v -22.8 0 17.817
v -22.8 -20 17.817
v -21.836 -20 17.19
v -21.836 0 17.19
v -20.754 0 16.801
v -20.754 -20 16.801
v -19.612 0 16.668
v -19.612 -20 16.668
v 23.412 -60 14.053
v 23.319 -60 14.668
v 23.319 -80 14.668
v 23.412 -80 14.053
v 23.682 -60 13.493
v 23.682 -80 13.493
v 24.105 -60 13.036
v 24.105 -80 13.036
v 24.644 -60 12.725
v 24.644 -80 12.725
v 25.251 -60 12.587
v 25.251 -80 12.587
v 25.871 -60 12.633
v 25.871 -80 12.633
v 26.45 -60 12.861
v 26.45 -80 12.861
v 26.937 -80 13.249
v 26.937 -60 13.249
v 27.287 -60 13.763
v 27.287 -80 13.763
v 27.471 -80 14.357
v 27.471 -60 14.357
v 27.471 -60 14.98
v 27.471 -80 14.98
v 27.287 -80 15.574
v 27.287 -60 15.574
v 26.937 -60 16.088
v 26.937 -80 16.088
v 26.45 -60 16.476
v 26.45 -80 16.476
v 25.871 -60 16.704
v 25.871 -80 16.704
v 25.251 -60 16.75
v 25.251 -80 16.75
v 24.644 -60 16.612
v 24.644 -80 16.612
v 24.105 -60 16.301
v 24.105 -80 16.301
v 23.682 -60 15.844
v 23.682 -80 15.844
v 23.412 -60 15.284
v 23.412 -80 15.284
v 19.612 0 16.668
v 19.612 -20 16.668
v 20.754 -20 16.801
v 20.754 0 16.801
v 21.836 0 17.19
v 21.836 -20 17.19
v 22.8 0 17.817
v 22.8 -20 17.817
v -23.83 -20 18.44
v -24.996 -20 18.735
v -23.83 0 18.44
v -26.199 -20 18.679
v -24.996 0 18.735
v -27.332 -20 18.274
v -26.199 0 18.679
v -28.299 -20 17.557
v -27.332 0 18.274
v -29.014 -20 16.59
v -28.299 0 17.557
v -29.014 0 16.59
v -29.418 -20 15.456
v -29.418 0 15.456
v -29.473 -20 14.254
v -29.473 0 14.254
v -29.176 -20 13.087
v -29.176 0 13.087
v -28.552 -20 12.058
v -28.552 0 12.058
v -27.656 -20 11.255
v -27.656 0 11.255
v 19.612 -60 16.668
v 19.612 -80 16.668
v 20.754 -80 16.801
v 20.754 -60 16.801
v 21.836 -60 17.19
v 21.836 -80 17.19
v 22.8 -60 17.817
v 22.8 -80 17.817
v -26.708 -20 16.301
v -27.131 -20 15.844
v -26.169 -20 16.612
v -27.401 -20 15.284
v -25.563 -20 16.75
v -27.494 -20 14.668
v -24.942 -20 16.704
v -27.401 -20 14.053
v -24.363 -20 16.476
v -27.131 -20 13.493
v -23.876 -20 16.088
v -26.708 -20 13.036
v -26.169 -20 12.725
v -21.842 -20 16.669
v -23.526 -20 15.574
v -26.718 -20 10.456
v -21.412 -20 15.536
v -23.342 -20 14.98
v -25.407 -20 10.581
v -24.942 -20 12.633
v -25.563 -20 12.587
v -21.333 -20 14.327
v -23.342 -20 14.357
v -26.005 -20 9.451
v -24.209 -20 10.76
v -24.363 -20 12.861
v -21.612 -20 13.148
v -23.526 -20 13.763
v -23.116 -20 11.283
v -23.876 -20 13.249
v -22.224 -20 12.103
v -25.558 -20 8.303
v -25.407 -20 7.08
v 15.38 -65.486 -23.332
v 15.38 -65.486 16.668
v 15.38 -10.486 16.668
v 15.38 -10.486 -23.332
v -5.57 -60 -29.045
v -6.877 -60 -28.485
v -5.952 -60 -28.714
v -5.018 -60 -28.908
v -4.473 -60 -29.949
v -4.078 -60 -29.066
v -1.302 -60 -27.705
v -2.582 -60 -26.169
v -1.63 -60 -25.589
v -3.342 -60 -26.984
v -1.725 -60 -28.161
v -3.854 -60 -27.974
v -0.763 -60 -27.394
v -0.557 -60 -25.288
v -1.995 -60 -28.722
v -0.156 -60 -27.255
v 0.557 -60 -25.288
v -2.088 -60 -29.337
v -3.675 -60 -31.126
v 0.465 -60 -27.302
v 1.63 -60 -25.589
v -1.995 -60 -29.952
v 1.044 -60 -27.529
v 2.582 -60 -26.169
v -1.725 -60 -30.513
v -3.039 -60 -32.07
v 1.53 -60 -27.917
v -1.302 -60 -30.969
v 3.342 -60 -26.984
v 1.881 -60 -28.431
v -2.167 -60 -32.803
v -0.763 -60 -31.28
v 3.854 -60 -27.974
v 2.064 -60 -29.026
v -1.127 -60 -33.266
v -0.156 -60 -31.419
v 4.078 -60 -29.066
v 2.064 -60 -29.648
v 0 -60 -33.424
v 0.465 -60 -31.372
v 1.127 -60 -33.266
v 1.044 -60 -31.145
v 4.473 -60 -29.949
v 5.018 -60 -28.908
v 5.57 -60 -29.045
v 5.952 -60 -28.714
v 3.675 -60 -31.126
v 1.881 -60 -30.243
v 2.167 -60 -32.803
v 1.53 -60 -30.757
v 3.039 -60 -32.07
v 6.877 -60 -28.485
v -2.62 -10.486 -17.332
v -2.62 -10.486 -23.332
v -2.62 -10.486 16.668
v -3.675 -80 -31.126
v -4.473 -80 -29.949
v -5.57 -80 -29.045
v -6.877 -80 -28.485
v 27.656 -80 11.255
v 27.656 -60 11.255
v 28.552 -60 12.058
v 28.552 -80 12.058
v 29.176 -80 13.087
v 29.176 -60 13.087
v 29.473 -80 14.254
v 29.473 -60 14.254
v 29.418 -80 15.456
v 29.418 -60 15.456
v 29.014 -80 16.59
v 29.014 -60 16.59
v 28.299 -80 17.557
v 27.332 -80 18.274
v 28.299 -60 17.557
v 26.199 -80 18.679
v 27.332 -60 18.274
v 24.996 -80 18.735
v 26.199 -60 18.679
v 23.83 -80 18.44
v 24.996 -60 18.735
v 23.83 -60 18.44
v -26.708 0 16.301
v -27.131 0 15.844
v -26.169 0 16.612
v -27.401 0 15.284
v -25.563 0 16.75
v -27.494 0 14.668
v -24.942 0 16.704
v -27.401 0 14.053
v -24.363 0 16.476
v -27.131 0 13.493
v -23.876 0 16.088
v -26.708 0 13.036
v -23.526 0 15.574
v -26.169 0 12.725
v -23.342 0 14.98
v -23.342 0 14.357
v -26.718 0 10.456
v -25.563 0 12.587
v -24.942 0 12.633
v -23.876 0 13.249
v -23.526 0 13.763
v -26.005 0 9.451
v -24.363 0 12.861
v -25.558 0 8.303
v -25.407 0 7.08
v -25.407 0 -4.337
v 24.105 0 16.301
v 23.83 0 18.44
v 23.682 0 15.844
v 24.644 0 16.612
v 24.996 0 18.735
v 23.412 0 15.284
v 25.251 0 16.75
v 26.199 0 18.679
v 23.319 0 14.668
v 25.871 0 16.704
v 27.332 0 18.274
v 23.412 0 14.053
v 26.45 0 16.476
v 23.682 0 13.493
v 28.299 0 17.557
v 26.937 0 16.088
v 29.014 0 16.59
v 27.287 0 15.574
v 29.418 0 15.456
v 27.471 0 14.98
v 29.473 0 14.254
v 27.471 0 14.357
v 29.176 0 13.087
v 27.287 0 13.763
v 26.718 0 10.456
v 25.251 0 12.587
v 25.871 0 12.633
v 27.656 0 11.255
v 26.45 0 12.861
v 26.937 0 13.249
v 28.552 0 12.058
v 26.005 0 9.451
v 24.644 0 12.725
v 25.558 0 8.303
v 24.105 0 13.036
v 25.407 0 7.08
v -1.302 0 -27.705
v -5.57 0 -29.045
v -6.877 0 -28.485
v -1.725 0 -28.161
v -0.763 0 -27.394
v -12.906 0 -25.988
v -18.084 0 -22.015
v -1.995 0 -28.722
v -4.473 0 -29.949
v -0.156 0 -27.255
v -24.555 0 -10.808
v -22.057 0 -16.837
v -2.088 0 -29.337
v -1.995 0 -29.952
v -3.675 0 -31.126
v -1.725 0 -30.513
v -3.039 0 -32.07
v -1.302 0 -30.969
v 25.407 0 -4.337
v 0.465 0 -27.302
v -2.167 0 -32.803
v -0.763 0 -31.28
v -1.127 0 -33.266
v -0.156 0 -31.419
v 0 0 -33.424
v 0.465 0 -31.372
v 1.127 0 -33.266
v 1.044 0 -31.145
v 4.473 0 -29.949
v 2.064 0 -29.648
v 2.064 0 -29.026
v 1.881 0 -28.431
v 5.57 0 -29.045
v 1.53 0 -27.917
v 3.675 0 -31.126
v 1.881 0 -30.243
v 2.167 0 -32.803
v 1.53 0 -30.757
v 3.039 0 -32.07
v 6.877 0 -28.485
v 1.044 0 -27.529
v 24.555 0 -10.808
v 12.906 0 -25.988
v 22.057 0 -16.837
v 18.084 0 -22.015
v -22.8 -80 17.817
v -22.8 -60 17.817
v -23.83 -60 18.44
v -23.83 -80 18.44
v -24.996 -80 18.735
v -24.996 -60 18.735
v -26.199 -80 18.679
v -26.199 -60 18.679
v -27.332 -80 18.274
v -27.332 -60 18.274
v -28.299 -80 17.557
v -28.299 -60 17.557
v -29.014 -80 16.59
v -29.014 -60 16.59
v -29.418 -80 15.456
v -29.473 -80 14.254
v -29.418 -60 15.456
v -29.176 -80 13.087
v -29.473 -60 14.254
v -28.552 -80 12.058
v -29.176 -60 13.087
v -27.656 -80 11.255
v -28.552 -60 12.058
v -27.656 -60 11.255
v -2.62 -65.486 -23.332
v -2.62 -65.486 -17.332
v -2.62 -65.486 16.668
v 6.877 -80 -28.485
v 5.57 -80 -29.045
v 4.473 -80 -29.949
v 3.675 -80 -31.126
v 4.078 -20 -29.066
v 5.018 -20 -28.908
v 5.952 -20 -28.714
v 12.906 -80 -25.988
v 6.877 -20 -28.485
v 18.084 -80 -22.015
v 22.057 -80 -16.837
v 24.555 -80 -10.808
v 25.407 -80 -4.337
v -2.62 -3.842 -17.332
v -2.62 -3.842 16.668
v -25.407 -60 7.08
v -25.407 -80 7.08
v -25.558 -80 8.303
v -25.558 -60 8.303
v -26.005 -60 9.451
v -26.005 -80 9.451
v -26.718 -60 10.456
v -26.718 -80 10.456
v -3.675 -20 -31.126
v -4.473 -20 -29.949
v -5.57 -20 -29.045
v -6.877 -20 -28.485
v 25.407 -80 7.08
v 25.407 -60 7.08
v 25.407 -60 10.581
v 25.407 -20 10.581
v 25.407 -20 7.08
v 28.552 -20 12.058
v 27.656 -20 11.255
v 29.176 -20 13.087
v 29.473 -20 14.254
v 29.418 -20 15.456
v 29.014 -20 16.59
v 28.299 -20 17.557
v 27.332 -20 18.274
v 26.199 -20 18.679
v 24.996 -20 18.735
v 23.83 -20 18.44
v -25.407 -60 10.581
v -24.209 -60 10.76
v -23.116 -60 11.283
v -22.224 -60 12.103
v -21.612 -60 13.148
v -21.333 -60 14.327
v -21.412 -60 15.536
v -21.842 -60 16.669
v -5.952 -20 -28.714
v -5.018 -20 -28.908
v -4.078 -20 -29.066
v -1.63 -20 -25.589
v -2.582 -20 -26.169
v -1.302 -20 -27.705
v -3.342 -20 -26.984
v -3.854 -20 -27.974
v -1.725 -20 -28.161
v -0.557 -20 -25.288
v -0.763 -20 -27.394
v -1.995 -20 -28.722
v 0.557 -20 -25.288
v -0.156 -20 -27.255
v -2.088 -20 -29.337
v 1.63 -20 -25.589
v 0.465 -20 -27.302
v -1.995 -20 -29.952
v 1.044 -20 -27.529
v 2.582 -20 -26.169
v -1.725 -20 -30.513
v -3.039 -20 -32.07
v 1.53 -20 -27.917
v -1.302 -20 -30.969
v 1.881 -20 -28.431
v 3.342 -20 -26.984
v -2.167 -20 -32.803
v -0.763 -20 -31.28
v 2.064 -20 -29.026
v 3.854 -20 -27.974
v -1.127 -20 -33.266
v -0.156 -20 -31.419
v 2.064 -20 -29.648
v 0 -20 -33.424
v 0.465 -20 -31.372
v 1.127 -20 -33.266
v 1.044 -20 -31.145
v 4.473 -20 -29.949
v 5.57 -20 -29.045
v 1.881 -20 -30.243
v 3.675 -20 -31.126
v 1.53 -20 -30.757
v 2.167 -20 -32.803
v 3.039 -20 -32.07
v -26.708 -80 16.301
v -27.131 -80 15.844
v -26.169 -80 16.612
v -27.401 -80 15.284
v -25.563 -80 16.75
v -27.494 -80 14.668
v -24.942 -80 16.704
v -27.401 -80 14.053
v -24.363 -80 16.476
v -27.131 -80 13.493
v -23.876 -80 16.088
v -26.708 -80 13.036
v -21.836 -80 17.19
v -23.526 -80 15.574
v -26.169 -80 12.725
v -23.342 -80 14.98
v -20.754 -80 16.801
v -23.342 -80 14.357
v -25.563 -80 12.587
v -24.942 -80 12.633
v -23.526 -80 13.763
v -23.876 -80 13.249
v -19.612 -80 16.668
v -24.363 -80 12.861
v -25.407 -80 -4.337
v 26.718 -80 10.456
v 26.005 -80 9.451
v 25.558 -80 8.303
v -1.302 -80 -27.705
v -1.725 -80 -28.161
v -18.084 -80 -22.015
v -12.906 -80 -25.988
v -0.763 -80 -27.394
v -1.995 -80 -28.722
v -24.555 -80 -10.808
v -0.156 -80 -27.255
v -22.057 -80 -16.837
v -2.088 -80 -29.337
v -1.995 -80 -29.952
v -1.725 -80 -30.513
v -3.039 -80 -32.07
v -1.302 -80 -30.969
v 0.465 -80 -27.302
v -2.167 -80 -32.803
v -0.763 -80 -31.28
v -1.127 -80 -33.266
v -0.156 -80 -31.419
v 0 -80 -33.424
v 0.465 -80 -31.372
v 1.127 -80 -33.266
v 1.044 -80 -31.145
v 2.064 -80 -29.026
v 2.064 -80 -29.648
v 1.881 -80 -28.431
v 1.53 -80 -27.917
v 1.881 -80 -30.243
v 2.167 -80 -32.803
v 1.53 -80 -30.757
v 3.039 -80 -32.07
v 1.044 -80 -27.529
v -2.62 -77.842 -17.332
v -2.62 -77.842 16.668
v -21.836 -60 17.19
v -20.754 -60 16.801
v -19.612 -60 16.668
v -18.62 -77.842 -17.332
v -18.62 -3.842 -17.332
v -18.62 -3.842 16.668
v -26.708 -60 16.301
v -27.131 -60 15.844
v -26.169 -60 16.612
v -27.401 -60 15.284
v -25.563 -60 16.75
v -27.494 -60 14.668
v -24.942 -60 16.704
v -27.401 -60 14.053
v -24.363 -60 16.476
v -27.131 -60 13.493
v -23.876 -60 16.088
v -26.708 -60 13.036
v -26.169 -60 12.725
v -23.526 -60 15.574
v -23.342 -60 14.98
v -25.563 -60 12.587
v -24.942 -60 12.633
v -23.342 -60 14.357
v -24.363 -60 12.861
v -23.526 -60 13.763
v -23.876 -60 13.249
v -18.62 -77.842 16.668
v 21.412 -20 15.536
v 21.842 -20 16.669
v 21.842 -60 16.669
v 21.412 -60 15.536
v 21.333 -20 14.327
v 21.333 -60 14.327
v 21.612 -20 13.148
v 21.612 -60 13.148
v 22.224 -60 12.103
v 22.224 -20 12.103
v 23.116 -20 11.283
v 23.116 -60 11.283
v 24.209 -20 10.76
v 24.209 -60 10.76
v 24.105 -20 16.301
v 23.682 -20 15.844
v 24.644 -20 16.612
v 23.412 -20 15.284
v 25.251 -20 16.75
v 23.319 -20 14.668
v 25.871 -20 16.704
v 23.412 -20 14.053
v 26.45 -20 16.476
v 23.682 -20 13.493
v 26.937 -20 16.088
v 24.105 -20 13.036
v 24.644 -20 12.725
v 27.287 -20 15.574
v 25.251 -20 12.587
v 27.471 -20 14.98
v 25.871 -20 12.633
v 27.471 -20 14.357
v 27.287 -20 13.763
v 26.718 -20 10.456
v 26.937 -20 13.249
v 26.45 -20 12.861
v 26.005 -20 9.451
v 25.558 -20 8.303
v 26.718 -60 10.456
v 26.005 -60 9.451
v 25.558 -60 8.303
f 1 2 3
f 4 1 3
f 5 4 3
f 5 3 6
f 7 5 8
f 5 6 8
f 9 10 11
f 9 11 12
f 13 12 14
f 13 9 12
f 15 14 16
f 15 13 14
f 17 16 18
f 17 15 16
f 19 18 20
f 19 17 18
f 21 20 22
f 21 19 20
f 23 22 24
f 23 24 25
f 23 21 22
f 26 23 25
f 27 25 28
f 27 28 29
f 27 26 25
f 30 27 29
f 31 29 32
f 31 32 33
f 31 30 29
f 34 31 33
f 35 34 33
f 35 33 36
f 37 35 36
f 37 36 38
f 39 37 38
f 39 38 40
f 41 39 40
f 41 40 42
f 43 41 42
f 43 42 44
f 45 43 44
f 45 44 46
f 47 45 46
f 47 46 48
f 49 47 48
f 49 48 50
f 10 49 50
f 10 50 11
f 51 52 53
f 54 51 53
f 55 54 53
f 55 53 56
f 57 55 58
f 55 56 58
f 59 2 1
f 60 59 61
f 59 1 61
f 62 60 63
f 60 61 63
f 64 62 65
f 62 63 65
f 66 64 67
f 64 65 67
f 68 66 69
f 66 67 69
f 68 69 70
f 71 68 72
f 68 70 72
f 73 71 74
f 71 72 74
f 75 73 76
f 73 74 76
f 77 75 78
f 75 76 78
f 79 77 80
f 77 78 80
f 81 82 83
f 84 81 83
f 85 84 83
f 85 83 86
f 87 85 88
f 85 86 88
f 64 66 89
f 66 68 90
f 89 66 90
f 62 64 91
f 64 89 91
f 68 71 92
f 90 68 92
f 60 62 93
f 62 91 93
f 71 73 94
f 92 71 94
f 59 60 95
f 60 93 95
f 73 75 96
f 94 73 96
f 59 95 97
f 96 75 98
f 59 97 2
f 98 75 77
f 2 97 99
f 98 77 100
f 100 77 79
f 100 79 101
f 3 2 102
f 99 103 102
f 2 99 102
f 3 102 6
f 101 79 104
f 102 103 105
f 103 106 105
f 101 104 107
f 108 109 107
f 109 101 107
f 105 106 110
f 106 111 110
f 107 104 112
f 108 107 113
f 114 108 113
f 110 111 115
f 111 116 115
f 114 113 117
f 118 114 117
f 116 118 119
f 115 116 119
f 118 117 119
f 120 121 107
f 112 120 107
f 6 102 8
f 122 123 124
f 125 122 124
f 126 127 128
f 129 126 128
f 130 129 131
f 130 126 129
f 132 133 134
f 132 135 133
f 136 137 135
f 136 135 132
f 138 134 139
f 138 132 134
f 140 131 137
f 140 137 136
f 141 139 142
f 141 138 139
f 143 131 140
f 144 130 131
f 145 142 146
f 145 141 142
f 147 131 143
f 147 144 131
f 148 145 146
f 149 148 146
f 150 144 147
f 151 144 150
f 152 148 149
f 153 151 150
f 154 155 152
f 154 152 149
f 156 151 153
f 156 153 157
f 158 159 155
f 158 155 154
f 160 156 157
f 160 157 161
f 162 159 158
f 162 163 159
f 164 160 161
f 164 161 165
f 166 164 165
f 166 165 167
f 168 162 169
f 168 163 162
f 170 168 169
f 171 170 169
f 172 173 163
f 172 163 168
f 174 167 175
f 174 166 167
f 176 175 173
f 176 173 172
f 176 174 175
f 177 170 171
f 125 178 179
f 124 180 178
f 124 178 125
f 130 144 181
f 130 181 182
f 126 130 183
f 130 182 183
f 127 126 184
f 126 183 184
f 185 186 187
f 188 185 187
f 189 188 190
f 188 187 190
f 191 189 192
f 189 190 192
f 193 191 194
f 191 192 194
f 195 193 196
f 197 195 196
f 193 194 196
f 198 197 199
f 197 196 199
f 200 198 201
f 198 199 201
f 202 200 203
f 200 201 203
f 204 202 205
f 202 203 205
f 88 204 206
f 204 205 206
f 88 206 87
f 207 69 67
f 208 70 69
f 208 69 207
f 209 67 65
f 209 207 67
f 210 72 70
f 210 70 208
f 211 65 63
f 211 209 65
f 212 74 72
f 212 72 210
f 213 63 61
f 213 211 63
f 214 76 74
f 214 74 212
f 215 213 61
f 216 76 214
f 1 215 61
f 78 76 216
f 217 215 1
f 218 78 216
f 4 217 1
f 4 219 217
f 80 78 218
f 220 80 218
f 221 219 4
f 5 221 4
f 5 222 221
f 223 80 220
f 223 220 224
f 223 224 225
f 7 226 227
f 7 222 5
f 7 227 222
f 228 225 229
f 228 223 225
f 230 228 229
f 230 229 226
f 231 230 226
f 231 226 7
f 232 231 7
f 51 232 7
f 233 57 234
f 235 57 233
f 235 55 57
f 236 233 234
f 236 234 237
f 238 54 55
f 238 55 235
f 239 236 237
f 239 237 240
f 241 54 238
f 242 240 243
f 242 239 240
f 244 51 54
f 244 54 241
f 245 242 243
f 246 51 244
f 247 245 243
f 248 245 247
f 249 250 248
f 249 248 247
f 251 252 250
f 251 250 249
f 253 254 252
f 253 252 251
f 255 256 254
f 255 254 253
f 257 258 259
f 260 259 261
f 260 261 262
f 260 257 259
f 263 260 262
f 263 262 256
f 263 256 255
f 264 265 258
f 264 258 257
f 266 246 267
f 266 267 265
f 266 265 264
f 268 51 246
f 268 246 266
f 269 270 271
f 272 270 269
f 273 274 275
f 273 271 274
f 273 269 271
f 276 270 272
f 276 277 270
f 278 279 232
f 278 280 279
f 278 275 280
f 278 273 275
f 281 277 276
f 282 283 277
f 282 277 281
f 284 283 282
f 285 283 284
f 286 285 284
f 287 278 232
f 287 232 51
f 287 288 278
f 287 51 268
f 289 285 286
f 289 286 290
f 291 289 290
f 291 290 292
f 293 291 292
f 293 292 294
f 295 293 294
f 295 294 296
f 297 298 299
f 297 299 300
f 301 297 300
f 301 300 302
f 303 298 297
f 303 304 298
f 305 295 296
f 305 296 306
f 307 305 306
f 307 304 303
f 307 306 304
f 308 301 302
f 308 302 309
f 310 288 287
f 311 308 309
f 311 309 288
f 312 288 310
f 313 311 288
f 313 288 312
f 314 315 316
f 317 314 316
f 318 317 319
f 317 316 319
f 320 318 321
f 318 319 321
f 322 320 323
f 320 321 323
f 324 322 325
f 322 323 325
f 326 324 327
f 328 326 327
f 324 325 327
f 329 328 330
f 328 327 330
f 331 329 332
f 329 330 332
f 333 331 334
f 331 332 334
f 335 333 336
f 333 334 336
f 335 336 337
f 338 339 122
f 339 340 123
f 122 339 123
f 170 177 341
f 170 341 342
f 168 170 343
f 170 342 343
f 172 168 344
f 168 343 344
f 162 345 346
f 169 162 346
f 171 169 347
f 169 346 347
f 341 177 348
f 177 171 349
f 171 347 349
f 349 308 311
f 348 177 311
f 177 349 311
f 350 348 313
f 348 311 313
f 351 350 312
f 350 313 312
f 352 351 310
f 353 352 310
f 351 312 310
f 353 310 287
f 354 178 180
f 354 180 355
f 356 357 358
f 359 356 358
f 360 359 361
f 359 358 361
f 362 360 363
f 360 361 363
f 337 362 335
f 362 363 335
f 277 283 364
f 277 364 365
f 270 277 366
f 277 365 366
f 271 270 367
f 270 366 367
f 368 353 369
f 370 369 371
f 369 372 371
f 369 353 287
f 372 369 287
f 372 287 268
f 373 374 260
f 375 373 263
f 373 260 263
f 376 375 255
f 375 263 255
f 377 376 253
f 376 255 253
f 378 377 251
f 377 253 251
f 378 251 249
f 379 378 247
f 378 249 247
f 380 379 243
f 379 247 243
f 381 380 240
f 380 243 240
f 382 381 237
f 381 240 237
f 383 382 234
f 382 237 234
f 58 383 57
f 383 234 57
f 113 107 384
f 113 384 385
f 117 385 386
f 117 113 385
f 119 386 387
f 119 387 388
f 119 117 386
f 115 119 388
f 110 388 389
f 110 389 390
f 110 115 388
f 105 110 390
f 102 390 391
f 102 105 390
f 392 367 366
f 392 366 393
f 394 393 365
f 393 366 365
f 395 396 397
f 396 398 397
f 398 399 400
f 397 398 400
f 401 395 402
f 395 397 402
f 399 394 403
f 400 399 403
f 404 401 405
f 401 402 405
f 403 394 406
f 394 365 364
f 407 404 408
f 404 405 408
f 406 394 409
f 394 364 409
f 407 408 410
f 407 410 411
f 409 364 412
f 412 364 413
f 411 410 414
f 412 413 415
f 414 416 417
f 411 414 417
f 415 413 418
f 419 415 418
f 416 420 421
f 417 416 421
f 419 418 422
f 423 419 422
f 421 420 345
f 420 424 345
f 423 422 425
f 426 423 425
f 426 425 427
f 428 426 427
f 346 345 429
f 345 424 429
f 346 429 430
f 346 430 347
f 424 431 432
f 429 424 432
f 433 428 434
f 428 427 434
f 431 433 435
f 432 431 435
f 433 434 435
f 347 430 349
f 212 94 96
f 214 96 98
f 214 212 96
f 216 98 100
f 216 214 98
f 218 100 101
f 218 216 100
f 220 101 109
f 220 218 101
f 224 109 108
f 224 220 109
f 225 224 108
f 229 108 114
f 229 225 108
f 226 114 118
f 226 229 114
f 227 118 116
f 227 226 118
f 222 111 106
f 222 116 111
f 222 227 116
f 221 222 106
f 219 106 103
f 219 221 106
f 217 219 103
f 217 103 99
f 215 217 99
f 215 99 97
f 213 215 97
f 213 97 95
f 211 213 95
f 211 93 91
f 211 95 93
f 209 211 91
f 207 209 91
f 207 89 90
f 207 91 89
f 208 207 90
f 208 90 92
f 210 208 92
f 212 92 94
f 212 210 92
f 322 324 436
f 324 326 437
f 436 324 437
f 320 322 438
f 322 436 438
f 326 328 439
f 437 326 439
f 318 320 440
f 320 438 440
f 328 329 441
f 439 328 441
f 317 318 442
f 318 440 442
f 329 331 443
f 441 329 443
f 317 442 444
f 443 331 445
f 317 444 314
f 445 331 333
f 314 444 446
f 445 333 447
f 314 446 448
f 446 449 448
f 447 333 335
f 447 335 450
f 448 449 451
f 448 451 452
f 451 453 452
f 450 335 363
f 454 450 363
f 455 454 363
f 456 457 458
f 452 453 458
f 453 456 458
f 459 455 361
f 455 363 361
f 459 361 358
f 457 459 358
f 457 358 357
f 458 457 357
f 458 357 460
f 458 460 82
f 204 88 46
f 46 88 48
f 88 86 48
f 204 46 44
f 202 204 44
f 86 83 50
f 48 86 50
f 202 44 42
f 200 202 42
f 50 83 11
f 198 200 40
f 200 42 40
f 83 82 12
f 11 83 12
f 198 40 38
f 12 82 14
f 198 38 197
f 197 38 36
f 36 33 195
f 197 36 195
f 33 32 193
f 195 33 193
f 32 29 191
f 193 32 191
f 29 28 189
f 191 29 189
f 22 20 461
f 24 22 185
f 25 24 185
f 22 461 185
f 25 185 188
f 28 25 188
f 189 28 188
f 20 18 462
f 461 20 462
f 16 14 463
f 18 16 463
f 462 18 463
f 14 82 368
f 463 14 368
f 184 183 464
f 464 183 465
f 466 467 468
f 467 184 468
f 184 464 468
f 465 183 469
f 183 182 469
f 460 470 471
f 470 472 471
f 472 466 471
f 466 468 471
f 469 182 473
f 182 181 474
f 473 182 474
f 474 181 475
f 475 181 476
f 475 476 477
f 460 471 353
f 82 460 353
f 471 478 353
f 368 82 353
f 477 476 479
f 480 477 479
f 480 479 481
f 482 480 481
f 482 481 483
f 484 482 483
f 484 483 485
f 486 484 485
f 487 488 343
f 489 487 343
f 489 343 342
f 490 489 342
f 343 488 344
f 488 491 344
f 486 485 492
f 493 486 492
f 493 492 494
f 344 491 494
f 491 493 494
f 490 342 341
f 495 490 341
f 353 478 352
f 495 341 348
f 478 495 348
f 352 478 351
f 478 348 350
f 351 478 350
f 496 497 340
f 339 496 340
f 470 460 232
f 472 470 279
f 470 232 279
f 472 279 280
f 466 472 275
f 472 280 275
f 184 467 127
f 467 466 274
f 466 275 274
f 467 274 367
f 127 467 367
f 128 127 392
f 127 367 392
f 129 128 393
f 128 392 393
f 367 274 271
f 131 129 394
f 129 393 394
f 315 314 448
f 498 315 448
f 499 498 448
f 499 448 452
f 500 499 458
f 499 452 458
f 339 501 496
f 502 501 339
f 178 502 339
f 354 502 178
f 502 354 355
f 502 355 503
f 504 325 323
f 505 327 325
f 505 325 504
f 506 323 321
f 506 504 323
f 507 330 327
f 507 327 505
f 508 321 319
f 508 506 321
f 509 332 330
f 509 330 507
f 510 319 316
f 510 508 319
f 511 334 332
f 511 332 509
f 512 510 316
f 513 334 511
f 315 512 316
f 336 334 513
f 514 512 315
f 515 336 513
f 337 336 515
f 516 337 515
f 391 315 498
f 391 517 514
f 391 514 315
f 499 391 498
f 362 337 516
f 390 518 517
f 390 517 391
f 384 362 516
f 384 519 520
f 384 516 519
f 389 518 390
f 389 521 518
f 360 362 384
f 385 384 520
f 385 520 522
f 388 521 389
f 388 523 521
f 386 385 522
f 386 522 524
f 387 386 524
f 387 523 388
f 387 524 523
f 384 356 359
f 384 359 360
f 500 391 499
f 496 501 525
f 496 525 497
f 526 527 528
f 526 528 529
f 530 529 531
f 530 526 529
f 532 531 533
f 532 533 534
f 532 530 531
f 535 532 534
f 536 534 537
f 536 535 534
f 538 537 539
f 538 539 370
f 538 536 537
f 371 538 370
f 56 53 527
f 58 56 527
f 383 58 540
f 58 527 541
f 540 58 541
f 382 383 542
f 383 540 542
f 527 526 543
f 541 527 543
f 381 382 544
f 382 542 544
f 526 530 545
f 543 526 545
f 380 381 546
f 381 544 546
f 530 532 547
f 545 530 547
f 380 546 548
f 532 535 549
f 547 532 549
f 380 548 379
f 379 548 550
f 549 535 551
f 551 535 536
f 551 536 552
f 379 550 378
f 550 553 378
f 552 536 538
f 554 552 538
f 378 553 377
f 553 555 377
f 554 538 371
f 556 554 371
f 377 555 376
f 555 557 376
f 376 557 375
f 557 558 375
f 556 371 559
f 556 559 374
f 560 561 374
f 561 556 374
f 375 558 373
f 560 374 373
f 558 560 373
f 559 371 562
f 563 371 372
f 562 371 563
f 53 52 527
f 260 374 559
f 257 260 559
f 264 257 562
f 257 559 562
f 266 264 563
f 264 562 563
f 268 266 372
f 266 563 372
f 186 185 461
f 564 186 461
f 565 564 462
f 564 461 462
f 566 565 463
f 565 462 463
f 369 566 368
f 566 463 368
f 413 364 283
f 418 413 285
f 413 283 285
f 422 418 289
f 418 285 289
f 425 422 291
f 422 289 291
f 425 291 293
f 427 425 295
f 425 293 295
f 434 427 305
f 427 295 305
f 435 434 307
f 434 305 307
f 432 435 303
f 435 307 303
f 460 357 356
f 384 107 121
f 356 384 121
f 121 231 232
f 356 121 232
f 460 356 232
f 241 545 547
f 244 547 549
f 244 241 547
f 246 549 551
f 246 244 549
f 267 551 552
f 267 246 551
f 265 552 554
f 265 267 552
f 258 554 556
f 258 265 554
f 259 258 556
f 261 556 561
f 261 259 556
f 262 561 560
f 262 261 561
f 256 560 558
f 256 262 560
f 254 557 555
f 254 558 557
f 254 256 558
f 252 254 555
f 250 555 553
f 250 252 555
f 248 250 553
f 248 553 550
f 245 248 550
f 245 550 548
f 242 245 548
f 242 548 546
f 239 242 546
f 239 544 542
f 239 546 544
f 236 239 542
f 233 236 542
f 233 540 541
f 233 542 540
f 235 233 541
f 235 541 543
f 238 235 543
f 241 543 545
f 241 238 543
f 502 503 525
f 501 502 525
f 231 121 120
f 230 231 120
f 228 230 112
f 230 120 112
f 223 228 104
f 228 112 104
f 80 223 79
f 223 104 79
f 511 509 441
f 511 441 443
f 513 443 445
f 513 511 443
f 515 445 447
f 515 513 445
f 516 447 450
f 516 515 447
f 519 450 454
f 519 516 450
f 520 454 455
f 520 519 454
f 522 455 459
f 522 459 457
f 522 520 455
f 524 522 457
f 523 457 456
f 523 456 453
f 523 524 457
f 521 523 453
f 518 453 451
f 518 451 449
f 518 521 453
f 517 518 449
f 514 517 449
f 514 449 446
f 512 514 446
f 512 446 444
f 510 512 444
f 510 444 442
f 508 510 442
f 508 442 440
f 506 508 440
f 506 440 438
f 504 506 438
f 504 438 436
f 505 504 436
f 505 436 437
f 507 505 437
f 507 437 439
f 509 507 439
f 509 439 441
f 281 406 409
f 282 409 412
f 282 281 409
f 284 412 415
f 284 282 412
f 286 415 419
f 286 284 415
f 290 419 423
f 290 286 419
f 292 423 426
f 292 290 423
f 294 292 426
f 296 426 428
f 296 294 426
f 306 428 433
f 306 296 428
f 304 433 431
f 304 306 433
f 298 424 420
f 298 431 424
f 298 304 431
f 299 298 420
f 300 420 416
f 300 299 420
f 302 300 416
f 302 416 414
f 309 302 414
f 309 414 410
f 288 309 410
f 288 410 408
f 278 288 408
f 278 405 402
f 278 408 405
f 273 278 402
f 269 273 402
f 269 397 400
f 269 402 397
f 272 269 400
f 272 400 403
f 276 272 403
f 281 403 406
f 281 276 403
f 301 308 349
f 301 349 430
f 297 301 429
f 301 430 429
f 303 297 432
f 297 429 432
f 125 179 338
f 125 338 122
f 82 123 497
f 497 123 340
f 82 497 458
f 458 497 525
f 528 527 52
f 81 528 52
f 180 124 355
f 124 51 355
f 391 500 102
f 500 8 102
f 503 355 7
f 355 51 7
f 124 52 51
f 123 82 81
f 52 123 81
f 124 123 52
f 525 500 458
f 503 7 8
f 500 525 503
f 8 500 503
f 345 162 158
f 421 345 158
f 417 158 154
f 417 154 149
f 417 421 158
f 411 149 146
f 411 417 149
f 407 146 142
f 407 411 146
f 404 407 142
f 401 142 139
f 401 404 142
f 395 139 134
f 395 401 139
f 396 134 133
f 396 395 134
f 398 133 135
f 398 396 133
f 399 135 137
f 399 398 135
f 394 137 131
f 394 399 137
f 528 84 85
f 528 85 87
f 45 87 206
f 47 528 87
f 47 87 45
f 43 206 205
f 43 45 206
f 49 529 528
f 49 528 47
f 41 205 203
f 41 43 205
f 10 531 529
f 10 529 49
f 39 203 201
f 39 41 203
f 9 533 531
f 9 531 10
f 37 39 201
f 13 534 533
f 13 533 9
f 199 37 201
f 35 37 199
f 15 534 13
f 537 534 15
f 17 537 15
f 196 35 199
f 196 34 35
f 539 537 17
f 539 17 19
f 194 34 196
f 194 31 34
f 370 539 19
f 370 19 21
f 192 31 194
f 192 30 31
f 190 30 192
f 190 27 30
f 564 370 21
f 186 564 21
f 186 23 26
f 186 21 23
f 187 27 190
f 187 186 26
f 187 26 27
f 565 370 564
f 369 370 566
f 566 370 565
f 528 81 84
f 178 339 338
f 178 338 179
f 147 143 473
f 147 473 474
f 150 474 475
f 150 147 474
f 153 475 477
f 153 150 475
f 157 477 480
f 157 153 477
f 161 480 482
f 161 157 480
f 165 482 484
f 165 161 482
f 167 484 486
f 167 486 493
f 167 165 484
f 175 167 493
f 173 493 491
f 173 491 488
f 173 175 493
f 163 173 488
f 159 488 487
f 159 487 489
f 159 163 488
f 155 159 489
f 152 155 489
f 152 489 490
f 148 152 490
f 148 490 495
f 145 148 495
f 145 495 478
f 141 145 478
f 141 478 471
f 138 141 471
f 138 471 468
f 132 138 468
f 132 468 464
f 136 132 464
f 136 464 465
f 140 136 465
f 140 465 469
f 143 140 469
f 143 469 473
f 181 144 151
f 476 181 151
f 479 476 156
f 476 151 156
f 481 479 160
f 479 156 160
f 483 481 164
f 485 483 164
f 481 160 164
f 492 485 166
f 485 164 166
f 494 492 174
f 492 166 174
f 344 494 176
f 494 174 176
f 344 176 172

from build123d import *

# Parameters (mm, degrees)
SKETCH1_R               = 38.1
BULKHEAD_BODY_DEPTH     = 12.7
SKETCH2_R               = 1.5875
CUT_EXTRUDE1_DEPTH      = 12.7
BOSS_EXTRUDE1_OUTLINE_R = 2.0875
BOSS_EXTRUDE1_DEPTH     = 80
CUT_EXTRUDE4_DEPTH      = 20
CUT_EXTRUDE4_DEPTH_BACK = 20
SKETCH5_R               = 4.0875
FILLET1_START           = -80
FILLET1_DEPTH           = 20
FILLET1_START_2         = -20
FILLET1_2_DEPTH         = 20
CUT_EXTRUDE5_DEPTH      = 34
SKETCH4_5_W             = 18
SKETCH4_5_H             = 55
CUT_EXTRUDE6_DEPTH      = 40


with BuildPart() as part:
    # Sketch1 → Bulkhead Body (new body)
    with BuildSketch(Plane(origin=(0, 0, 0), x_dir=(1, 0, 0), z_dir=(0, 1, 0))):
        with Locations(Location((0, 0, 0), (0, 0, 270))):
            Circle(SKETCH1_R)
    extrude(amount=BULKHEAD_BODY_DEPTH)

    # Sketch2 → Cut-Extrude1 (cut)
    with BuildSketch(Plane(origin=(0, 12.7, 0), x_dir=(1, 0, 0), z_dir=(0, 1, 0))):
        with Locations(Location((0, 29.337, 0), (0, 0, 270))):
            Circle(SKETCH2_R)
        with Locations(Location((25.406587271, -14.5685, 0), (0, 0, 270))):
            Circle(SKETCH2_R)
        with Locations(Location((-25.31998473, -14.6185, 0), (0, 0, 270))):
            Circle(SKETCH2_R)
    extrude(amount=-CUT_EXTRUDE1_DEPTH, mode=Mode.SUBTRACT)


with BuildPart() as body_2:
    # Boss-Extrude1: read off the stored shape, not the designer's step
    # Boss-Extrude1 outline → Boss-Extrude1 (new body)
    with BuildSketch(Plane(origin=(0, 0, 0), x_dir=(-1, 0, 0), z_dir=(0, -1, 0))):
        with BuildLine():
            ThreePointArc((-4.078497939, 29.065871225), (-19.338013085, 20.664924444), (-25.406587271, 4.337))
            Line((-25.406587271, 4.337), (-25.406587271, -10.581))
            ThreePointArc((-25.406587271, -10.581), (-28.933813961, -16.734009168), (-21.841807299, -16.6685))
            Line((-21.841807299, -16.6685), (21.841807299, -16.6685))
            ThreePointArc((21.841807299, -16.6685), (28.933813961, -16.734009168), (25.406587271, -10.581))
            Line((25.406587271, -10.581), (25.406587271, 4.337))
            ThreePointArc((25.406587271, 4.337), (19.338013085, 20.664924444), (4.078497939, 29.065871225))
            ThreePointArc((4.078497939, 29.065871225), (0, 33.4245), (-4.078497939, 29.065871225))
        make_face()
        with Locations((-25.406587271, -14.6685)):
            Circle(BOSS_EXTRUDE1_OUTLINE_R, mode=Mode.SUBTRACT)
        with Locations((25.406587271, -14.6685)):
            Circle(BOSS_EXTRUDE1_OUTLINE_R, mode=Mode.SUBTRACT)
        with Locations((0, 29.337)):
            Circle(BOSS_EXTRUDE1_OUTLINE_R, mode=Mode.SUBTRACT)
    extrude(amount=BOSS_EXTRUDE1_DEPTH)

    # Sketch5 → Cut-Extrude4 (cut, two sides: drawn at the far end of the back side and taken through both)
    with BuildSketch(Plane(origin=(0, -40, 0), x_dir=(-1, 0, 0), z_dir=(0, -1, 0)).offset(-CUT_EXTRUDE4_DEPTH_BACK)):
        with Locations((25.406587271, -14.6685)):
            Circle(SKETCH5_R)
        with Locations((-25.406587271, -14.6685)):
            Circle(SKETCH5_R)
        with Locations((0, 29.337)):
            Circle(SKETCH5_R)
    extrude(amount=CUT_EXTRUDE4_DEPTH + CUT_EXTRUDE4_DEPTH_BACK, mode=Mode.SUBTRACT)

    # Fillet1: read off the stored shape, not the designer's step
    # Fillet1 outline → Fillet1 (add)
    with BuildSketch(Plane(origin=(0, 0, 0), x_dir=(1, 0, 0), z_dir=(0, 1, 0)).offset(FILLET1_START)):
        with BuildLine():
            ThreePointArc((-4.078497939, 29.065871225), (-4.011334199, 30.122400658), (-3.67508636, 31.126244671))
            ThreePointArc((-3.67508636, 31.126244671), (-4.988887184, 29.457894165), (-6.876601915, 28.485269307))
            ThreePointArc((-6.876601915, 28.485269307), (-5.485852661, 28.815583764), (-4.078497939, 29.065871225))
        make_face()
        with BuildLine():
            ThreePointArc((6.876601915, 28.485269307), (4.988887184, 29.457894165), (3.67508636, 31.126244671))
            ThreePointArc((3.67508636, 31.126244671), (4.011334199, 30.122400658), (4.078497939, 29.065871225))
            ThreePointArc((4.078497939, 29.065871225), (5.485852661, 28.815583764), (6.876601915, 28.485269307))
        make_face()
        with BuildLine():
            Line((-25.406587271, -10.581), (-25.406587271, -7.080176321))
            ThreePointArc((-25.406587271, -7.080176321), (-26.0045901, -9.451340784), (-27.655555634, -11.255320024))
            ThreePointArc((-27.655555634, -11.255320024), (-26.580530007, -10.753207584), (-25.406587271, -10.581))
        make_face()
        with BuildLine():
            ThreePointArc((27.655555634, -11.255320024), (26.0045901, -9.451340784), (25.406587271, -7.080176321))
            Line((25.406587271, -7.080176321), (25.406587271, -10.581))
            ThreePointArc((25.406587271, -10.581), (26.580530007, -10.753207584), (27.655555634, -11.255320024))
        make_face()
        with BuildLine():
            ThreePointArc((-21.841807299, -16.6685), (-22.267923157, -17.286981206), (-22.80000844, -17.817055708))
            ThreePointArc((-22.80000844, -17.817055708), (-21.306050221, -16.964394269), (-19.611532806, -16.6685))
            Line((-19.611532806, -16.6685), (-21.841807299, -16.6685))
        make_face()
        with BuildLine():
            ThreePointArc((19.611532806, -16.6685), (21.306050221, -16.964394269), (22.80000844, -17.817055708))
            ThreePointArc((22.80000844, -17.817055708), (22.267923157, -17.286981206), (21.841807299, -16.6685))
            Line((21.841807299, -16.6685), (19.611532806, -16.6685))
        make_face()
    extrude(amount=FILLET1_DEPTH)

    # Fillet1 2 outline → Fillet1 2 (add)
    with BuildSketch(Plane(origin=(0, 0, 0), x_dir=(1, 0, 0), z_dir=(0, 1, 0)).offset(FILLET1_START_2)):
        with BuildLine():
            ThreePointArc((-4.078497939, 29.065871225), (-4.011334199, 30.122400658), (-3.67508636, 31.126244671))
            ThreePointArc((-3.67508636, 31.126244671), (-4.988887184, 29.457894165), (-6.876601915, 28.485269307))
            ThreePointArc((-6.876601915, 28.485269307), (-5.485852661, 28.815583764), (-4.078497939, 29.065871225))
        make_face()
        with BuildLine():
            ThreePointArc((6.876601915, 28.485269307), (4.988887184, 29.457894165), (3.67508636, 31.126244671))
            ThreePointArc((3.67508636, 31.126244671), (4.011334199, 30.122400658), (4.078497939, 29.065871225))
            ThreePointArc((4.078497939, 29.065871225), (5.485852661, 28.815583764), (6.876601915, 28.485269307))
        make_face()
        with BuildLine():
            Line((-25.406587271, -10.581), (-25.406587271, -7.080176321))
            ThreePointArc((-25.406587271, -7.080176321), (-26.0045901, -9.451340784), (-27.655555634, -11.255320024))
            ThreePointArc((-27.655555634, -11.255320024), (-26.580530007, -10.753207584), (-25.406587271, -10.581))
        make_face()
        with BuildLine():
            ThreePointArc((27.655555634, -11.255320024), (26.0045901, -9.451340784), (25.406587271, -7.080176321))
            Line((25.406587271, -7.080176321), (25.406587271, -10.581))
            ThreePointArc((25.406587271, -10.581), (26.580530007, -10.753207584), (27.655555634, -11.255320024))
        make_face()
        with BuildLine():
            ThreePointArc((-21.841807299, -16.6685), (-22.267923157, -17.286981206), (-22.80000844, -17.817055708))
            ThreePointArc((-22.80000844, -17.817055708), (-21.306050221, -16.964394269), (-19.611532806, -16.6685))
            Line((-19.611532806, -16.6685), (-21.841807299, -16.6685))
        make_face()
        with BuildLine():
            ThreePointArc((19.611532806, -16.6685), (21.306050221, -16.964394269), (22.80000844, -17.817055708))
            ThreePointArc((22.80000844, -17.817055708), (22.267923157, -17.286981206), (21.841807299, -16.6685))
            Line((21.841807299, -16.6685), (19.611532806, -16.6685))
        make_face()
    extrude(amount=FILLET1_2_DEPTH)

    # Sketch4 → Cut-Extrude5 (cut)
    with BuildSketch(Plane.XY.offset(16.6685)):
        Polygon((-2.620203368, -65.485753458), (-2.620203368, -10.485753458), (-2.620203368, -3.842418919), (-18.620203368, -3.842418919), (-18.620203368, -77.842418919), (-2.620203368, -77.842418919), align=None)
    extrude(amount=-CUT_EXTRUDE5_DEPTH, mode=Mode.SUBTRACT)

    # Sketch4<5> → Cut-Extrude6 (cut)
    with BuildSketch(Plane.XY.offset(16.6685)):
        with Locations((6.379796632, -37.985753458)):
            Rectangle(SKETCH4_5_W, SKETCH4_5_H)
    extrude(amount=-CUT_EXTRUDE6_DEPTH, mode=Mode.SUBTRACT)


solid = body_2.part
